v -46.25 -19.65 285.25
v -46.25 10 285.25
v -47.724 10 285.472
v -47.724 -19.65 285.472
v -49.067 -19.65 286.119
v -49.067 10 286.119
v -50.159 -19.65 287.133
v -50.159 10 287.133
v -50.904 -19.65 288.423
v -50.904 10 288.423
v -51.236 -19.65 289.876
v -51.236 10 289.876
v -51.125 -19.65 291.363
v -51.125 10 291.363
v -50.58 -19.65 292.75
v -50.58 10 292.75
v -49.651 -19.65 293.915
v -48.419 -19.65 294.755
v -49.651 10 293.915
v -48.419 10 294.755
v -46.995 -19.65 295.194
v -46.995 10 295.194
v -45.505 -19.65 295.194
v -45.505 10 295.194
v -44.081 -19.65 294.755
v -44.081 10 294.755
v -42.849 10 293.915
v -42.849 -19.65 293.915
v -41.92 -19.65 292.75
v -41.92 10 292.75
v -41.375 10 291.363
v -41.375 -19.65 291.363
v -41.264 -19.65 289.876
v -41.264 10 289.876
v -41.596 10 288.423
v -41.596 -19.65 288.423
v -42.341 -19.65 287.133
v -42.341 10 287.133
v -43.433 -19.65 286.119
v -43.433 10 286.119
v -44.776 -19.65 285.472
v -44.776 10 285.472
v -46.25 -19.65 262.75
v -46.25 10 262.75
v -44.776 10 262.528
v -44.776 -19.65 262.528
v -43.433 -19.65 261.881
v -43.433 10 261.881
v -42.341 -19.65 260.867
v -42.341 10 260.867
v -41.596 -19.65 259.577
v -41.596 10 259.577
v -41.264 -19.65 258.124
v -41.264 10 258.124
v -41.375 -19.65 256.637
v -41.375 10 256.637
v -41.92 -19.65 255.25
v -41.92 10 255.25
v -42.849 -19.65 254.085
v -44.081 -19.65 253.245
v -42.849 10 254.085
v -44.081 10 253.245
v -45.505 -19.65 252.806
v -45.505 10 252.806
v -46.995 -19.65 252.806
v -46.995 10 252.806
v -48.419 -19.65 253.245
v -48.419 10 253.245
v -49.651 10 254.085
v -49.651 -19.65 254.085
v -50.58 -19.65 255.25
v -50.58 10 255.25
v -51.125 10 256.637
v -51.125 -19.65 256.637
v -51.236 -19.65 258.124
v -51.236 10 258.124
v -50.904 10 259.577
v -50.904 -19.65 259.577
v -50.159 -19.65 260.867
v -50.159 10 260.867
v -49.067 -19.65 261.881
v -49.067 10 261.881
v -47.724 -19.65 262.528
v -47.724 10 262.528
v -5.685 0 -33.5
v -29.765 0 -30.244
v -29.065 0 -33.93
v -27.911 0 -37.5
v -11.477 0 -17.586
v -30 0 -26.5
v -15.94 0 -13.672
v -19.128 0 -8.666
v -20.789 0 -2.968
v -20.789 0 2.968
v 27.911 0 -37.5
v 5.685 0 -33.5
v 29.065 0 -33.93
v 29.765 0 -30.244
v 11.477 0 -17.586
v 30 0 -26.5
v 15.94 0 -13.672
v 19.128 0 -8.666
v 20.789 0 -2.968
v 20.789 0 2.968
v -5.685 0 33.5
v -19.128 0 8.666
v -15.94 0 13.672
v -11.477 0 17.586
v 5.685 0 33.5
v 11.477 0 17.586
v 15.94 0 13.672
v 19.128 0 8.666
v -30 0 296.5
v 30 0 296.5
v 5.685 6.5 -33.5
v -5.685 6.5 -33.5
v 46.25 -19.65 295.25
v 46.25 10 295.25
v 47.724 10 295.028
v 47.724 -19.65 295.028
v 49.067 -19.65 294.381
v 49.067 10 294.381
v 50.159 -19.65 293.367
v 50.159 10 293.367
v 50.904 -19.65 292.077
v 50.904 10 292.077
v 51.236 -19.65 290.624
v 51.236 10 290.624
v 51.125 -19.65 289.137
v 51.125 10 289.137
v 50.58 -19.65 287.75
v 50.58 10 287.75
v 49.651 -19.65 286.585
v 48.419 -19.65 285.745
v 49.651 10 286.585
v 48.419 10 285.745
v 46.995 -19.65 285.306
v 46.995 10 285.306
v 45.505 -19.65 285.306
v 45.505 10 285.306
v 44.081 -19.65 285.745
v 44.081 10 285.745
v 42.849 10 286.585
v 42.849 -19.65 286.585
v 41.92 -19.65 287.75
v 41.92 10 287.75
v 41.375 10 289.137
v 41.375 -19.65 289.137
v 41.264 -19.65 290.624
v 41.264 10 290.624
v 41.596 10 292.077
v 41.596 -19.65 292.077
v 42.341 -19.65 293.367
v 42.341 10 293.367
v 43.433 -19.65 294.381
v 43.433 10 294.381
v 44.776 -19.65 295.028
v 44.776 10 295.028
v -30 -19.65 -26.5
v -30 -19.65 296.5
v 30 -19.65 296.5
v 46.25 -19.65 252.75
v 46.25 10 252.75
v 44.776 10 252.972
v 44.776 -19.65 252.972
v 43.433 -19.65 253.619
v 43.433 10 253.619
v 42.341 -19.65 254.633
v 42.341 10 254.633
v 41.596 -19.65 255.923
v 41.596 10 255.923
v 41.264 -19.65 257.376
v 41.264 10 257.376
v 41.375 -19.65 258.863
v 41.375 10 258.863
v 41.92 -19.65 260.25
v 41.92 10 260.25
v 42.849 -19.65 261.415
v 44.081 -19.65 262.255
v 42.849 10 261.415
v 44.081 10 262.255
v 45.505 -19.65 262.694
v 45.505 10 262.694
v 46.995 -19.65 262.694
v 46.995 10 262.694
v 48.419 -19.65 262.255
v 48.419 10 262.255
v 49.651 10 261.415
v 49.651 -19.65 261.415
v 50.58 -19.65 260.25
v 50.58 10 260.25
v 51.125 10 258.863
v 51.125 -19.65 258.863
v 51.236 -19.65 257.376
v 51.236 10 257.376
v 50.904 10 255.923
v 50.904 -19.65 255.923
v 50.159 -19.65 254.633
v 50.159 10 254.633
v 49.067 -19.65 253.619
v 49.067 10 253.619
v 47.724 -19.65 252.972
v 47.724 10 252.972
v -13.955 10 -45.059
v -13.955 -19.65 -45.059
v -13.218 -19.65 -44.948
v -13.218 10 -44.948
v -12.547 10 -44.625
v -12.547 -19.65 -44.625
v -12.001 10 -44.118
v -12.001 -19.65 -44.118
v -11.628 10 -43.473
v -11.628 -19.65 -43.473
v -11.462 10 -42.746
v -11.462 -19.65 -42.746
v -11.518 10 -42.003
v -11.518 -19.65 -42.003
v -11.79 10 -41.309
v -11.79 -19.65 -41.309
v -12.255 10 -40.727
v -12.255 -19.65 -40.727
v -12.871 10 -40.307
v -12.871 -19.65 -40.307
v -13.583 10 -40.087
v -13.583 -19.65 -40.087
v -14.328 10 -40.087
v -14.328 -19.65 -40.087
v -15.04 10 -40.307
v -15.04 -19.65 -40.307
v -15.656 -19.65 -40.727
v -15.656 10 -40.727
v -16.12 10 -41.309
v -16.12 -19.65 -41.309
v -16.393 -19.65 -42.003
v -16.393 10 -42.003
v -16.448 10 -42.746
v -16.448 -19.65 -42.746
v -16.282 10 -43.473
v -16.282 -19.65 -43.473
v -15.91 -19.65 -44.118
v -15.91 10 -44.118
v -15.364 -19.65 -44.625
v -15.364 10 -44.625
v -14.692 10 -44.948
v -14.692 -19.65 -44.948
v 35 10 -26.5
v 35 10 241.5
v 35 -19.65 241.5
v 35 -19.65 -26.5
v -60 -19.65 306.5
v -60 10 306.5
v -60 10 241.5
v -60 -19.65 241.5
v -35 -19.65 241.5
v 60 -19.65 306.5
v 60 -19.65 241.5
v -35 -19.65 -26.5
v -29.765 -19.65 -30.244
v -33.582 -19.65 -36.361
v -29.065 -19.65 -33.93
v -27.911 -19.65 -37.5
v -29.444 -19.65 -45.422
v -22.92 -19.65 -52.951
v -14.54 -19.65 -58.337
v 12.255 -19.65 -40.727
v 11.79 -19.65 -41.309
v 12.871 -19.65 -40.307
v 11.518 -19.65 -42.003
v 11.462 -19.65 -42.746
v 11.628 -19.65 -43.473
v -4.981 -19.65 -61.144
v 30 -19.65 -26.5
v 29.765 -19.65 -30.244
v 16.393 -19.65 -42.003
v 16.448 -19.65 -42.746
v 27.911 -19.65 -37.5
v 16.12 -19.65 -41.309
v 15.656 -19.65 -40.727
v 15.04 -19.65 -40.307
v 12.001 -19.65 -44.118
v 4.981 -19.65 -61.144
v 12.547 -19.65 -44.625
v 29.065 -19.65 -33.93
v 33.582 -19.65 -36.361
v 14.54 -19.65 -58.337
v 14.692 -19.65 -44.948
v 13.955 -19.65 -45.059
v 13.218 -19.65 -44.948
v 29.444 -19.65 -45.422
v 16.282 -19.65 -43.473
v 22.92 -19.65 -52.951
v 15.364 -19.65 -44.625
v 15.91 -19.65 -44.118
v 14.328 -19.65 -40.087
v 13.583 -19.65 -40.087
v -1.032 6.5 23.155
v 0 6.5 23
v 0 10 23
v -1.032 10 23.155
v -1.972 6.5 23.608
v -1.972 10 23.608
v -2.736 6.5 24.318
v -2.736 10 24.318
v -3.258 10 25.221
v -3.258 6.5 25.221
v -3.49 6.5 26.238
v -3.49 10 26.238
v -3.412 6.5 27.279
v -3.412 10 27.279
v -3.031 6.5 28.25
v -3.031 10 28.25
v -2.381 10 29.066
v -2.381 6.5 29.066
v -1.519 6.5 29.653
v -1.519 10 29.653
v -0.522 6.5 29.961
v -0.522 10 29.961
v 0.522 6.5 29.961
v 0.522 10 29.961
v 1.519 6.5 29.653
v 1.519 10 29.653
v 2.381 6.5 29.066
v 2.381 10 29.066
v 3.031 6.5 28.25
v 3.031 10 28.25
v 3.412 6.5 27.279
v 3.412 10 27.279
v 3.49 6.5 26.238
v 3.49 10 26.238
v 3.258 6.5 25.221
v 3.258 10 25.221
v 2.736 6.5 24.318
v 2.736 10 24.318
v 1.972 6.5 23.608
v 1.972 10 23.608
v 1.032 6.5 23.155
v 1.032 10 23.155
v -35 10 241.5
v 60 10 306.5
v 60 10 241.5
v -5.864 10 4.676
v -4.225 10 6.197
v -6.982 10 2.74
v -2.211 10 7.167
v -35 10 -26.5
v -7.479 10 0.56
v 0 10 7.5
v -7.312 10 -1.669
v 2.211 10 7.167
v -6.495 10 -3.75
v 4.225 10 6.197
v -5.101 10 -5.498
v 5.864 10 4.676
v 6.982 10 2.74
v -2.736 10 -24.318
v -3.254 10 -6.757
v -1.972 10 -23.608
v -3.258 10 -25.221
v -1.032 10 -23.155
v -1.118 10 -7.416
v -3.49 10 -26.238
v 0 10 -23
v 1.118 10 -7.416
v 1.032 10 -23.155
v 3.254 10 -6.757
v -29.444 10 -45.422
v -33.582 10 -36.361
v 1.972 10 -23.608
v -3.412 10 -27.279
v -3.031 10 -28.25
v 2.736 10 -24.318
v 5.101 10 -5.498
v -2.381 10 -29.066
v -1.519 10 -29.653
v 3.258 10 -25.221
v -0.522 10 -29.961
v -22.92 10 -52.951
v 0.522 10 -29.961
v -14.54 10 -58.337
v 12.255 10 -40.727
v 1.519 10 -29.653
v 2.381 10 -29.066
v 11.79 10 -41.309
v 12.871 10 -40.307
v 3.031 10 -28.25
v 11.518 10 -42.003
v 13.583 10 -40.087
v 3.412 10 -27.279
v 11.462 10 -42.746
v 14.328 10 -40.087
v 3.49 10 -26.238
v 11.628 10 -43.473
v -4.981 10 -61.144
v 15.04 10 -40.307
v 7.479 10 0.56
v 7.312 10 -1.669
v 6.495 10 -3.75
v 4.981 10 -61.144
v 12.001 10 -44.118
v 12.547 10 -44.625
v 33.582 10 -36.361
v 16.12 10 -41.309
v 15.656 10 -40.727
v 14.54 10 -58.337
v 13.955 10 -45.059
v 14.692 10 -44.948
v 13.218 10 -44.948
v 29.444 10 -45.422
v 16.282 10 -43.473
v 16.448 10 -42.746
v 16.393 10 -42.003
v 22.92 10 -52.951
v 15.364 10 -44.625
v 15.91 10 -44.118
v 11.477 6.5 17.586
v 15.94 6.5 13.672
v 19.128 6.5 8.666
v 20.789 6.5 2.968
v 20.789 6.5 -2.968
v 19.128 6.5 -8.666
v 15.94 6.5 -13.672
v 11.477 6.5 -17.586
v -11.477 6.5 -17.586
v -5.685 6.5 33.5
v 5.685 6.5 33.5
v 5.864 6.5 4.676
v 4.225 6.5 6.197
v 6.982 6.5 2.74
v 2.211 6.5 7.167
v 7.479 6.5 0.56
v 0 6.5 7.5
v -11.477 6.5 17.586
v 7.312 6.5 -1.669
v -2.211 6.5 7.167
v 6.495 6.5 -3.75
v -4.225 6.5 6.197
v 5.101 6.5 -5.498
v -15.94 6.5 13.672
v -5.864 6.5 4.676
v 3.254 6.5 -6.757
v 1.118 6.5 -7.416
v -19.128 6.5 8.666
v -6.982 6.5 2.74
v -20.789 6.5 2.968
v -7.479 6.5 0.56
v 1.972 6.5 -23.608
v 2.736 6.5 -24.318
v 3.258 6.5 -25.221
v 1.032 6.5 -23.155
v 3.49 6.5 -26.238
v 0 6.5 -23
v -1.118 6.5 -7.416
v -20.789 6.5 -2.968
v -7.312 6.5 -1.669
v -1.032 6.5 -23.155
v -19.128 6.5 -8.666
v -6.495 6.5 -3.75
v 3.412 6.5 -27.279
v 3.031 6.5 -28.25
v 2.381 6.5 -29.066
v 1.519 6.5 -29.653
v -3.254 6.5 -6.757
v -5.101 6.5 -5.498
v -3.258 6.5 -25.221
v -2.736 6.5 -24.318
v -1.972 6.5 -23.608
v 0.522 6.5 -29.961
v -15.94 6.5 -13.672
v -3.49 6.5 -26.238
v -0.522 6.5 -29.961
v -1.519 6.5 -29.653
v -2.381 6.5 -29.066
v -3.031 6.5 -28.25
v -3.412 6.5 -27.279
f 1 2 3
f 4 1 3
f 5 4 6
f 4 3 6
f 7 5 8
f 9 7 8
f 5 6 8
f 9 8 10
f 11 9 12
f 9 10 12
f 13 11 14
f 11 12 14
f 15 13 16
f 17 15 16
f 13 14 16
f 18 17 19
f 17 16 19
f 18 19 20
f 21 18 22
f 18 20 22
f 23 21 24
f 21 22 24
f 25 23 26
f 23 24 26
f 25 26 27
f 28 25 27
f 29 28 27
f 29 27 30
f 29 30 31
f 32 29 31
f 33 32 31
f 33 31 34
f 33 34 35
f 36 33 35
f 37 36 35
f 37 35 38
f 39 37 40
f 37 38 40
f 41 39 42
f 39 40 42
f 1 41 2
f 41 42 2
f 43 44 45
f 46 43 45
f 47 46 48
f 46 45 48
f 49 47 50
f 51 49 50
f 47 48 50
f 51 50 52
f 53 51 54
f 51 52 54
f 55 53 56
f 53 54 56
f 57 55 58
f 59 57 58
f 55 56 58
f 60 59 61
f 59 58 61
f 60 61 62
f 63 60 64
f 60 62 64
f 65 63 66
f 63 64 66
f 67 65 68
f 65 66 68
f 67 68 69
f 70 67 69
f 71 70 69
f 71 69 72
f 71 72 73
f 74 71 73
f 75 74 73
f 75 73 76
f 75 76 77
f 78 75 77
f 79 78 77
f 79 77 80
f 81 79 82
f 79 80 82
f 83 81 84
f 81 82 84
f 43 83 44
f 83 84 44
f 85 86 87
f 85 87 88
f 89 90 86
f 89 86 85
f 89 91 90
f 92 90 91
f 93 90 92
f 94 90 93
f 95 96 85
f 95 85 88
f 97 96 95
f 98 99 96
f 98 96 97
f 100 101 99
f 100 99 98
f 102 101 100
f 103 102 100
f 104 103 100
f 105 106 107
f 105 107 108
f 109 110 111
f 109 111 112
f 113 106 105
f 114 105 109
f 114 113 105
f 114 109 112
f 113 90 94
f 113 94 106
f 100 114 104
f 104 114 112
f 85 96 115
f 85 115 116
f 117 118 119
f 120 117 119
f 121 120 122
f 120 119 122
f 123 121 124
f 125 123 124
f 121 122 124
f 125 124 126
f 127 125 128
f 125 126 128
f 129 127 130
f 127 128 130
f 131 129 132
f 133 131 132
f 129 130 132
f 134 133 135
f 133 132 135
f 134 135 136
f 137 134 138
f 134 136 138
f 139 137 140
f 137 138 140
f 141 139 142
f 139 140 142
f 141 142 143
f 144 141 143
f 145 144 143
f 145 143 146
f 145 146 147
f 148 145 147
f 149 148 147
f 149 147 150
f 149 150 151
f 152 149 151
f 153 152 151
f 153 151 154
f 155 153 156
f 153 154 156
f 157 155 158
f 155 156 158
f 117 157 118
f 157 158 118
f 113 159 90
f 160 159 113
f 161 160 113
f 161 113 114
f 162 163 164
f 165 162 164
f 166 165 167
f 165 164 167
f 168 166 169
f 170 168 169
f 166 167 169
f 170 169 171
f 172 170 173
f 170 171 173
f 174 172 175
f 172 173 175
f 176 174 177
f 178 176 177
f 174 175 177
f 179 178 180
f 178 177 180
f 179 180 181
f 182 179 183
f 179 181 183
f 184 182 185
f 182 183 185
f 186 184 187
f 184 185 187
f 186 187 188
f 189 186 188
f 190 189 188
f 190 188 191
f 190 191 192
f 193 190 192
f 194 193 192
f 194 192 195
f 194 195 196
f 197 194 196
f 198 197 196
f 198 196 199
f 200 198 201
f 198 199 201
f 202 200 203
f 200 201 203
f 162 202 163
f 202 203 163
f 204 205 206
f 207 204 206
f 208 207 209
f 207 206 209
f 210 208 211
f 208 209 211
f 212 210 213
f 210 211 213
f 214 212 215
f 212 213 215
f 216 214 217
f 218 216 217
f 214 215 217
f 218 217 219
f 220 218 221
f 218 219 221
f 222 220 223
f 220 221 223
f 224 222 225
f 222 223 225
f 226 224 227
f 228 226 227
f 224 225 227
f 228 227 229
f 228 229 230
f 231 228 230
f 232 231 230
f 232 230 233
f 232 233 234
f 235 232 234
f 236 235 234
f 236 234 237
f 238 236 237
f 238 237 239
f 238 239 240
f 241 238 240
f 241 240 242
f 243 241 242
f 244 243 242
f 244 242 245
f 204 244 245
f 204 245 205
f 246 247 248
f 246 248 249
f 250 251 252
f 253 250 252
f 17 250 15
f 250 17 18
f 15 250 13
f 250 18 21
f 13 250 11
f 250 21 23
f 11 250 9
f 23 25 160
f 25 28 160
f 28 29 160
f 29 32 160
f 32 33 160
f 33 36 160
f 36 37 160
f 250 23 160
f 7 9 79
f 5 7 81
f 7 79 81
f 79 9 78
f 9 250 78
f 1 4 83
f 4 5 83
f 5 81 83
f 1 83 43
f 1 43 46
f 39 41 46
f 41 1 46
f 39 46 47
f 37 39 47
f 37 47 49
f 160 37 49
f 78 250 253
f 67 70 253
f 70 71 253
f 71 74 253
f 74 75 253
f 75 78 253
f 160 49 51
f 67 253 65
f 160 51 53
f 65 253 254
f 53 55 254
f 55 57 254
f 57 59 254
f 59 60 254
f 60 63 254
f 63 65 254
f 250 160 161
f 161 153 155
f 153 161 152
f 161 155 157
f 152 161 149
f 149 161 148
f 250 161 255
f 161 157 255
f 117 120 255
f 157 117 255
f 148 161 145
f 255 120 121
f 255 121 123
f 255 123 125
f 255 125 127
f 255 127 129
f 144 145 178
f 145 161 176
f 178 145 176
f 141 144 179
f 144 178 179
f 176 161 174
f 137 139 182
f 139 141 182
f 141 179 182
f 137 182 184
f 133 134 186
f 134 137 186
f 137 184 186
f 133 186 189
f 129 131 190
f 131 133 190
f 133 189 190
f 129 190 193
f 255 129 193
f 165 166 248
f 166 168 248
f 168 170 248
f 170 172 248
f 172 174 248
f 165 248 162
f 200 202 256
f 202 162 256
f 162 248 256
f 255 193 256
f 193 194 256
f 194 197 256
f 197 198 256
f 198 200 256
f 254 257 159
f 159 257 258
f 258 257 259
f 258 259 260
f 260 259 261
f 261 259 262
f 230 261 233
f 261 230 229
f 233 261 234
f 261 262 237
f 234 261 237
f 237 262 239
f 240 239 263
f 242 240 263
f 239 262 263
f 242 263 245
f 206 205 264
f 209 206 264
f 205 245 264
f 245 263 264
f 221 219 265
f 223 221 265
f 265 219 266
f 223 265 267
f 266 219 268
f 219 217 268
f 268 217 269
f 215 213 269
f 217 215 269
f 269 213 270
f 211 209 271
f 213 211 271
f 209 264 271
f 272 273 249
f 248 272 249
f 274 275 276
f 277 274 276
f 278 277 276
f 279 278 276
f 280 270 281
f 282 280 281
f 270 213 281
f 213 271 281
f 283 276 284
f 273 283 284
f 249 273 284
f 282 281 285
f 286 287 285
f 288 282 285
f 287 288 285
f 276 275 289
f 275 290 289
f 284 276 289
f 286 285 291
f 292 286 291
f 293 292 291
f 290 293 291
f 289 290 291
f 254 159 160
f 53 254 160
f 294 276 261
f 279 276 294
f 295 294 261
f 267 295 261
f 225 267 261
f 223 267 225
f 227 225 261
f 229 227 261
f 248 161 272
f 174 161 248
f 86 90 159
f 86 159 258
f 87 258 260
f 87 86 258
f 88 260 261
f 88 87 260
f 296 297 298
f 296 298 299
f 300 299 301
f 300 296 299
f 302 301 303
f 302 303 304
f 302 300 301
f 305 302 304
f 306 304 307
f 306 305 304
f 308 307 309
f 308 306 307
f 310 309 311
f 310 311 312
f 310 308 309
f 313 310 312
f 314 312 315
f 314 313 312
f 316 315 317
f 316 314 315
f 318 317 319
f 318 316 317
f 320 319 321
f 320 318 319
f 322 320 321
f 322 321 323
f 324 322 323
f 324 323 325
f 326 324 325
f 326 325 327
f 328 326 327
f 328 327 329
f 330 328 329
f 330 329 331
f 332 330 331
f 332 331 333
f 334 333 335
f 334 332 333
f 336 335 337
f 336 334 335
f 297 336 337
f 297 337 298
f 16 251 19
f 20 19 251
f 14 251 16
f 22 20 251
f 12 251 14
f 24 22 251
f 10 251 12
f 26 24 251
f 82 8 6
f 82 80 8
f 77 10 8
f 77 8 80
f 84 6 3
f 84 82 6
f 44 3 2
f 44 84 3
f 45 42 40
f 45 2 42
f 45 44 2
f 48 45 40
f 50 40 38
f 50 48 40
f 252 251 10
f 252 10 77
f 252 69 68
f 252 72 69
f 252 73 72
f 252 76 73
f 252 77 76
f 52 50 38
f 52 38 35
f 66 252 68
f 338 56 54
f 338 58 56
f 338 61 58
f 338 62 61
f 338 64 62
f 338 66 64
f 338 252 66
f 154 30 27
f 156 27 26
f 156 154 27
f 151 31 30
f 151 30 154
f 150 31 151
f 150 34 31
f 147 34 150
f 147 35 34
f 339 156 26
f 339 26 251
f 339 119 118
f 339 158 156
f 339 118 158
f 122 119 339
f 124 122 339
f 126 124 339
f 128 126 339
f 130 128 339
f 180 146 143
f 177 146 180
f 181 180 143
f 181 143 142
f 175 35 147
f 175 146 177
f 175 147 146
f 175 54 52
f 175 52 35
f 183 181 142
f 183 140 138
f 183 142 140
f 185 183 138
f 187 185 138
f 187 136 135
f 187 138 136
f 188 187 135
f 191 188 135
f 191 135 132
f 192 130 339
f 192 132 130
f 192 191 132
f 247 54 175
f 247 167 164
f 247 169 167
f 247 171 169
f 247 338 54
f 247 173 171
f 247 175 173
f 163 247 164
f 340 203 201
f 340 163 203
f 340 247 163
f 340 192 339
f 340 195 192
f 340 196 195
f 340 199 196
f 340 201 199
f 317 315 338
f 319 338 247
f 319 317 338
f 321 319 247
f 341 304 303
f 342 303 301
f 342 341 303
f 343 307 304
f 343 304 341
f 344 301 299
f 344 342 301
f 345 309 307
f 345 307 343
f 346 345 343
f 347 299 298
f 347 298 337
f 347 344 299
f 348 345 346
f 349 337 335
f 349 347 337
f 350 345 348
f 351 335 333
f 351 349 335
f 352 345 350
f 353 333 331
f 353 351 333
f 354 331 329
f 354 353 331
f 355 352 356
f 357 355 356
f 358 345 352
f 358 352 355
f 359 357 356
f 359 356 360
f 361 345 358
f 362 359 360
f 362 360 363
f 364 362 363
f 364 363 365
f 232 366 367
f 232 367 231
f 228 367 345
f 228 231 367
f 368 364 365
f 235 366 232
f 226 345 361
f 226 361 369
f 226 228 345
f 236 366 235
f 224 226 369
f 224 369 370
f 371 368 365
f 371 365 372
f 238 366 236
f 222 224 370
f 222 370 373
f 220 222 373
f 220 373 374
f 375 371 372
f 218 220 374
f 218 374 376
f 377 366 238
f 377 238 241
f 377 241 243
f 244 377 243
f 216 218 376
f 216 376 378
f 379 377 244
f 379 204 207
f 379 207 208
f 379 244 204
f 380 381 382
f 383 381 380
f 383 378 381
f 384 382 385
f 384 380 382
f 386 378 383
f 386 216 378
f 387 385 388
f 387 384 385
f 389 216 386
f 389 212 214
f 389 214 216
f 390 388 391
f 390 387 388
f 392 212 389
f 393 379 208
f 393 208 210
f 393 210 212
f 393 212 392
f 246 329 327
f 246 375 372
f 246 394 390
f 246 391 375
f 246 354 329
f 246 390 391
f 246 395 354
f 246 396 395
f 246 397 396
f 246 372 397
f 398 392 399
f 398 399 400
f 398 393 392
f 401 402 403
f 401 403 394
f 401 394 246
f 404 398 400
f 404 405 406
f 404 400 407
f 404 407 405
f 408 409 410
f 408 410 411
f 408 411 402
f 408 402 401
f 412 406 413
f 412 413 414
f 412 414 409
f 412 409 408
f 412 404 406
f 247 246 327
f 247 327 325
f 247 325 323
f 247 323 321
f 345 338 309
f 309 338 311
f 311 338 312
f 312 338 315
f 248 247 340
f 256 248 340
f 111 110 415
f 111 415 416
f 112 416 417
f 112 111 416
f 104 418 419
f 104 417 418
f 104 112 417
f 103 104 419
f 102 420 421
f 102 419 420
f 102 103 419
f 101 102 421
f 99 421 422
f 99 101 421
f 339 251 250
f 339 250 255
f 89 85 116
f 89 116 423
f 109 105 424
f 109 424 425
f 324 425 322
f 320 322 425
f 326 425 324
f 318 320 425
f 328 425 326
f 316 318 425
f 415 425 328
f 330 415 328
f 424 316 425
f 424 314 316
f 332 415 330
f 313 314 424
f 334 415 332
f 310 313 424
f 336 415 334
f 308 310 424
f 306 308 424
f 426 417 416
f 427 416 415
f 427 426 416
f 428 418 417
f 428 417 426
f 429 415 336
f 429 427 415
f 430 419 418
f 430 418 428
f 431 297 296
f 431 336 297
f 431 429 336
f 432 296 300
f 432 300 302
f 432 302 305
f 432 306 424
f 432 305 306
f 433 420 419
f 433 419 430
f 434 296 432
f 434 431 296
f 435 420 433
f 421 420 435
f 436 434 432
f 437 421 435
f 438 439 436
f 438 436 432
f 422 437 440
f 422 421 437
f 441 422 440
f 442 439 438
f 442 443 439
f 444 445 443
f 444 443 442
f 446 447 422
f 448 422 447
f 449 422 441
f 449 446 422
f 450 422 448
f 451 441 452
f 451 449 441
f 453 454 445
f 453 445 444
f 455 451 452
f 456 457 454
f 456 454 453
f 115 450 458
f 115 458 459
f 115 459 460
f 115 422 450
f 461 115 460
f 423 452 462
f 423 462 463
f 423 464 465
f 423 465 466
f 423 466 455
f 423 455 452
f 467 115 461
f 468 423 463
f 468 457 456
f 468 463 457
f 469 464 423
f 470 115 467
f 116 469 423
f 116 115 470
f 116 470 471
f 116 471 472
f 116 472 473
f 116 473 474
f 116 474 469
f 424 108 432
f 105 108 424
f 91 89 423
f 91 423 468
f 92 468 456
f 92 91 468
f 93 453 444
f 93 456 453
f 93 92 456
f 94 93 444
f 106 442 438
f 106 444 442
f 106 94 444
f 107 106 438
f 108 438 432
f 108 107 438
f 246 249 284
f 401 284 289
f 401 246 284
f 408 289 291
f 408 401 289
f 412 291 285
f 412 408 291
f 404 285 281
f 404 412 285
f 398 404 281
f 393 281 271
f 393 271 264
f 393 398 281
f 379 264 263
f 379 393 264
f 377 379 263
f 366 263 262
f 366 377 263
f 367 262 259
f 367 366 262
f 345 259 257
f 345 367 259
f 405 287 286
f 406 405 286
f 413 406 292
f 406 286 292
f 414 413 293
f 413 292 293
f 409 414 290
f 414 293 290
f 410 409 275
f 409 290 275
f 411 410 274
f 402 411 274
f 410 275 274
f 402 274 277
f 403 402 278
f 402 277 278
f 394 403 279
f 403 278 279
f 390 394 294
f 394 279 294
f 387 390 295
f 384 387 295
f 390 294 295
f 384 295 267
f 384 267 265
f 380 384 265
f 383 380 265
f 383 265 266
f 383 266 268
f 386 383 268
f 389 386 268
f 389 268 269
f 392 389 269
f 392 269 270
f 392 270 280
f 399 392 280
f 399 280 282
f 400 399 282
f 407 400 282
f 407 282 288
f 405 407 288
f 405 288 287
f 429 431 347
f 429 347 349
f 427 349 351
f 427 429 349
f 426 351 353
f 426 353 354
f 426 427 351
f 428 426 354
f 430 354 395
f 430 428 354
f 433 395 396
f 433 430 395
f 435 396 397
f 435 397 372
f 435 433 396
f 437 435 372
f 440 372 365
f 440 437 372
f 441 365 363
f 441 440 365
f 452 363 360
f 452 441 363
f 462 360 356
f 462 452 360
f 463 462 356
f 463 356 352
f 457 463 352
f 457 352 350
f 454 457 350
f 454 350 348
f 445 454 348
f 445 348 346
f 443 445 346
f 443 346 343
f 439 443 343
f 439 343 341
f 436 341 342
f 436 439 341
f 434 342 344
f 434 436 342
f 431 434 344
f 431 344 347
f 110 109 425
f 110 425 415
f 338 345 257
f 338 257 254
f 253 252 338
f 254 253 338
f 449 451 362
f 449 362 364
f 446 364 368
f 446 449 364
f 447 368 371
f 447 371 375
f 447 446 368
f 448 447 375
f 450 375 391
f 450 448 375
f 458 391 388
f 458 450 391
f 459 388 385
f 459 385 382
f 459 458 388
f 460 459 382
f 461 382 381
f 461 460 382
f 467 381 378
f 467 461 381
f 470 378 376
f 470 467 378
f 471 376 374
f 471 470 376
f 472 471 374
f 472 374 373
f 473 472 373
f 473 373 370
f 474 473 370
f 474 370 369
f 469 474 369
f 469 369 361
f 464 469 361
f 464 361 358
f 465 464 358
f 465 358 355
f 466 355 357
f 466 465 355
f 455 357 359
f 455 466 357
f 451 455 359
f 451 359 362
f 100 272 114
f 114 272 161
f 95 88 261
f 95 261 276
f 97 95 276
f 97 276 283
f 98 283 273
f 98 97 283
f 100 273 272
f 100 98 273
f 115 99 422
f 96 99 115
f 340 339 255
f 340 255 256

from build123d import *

# Parameters (mm, degrees)
BOSS_EXTRUDE1_DEPTH             = 10
BOSS_EXTRUDE2_START             = -3.5
SKETCH2_R                       = 3.5
SKETCH2_R_2                     = 7.5
BOSS_EXTRUDE2_DEPTH             = 3.5
BOSS_EXTRUDE3_REACH             = 247.545
BOSS_EXTRUDE3_DIRECTION_2_DEPTH = 19.65
SKETCH4_R                       = 2.5
CUT_EXTRUDE1_DEPTH              = 248.78291406
SKETCH5_W                       = 120
SKETCH5_H                       = 65
SKETCH5_R                       = 5
BOSS_EXTRUDE4_DEPTH             = 29.65
SKETCH6_W                       = 60
SKETCH6_H                       = 55
CUT_EXTRUDE2_DEPTH              = 19.65


with BuildPart() as part:
    # Sketch1 → Boss-Extrude1 (new body)
    with BuildSketch(Plane(origin=(0, 0, 0), x_dir=(1, 0, 0), z_dir=(0, 1, 0))):
        with BuildLine():
            Line((30, 26.5), (30, -243.5))
            Line((30, -243.5), (-30, -243.5))
            Line((-30, -243.5), (-30, 26.5))
            ThreePointArc((-30, 26.5), (0, 56.5), (30, 26.5))
        make_face()
        with BuildLine():
            ThreePointArc((11.477382224, -17.586065429), (21, 0), (11.477382224, 17.586065429))
            Line((11.477382224, 17.586065429), (5.68518373, 33.5))
            Line((5.68518373, 33.5), (-5.68518373, 33.5))
            Line((-5.68518373, 33.5), (-11.477382224, 17.586065429))
            ThreePointArc((-11.477382224, 17.586065429), (-21, 0), (-11.477382224, -17.586065429))
            Line((-11.477382224, -17.586065429), (-5.68518373, -33.5))
            Line((-5.68518373, -33.5), (5.68518373, -33.5))
            Line((5.68518373, -33.5), (11.477382224, -17.586065429))
        make_face(mode=Mode.SUBTRACT)
    extrude(amount=BOSS_EXTRUDE1_DEPTH)

    # Sketch2 → Boss-Extrude2 (add)
    with BuildSketch(Plane(origin=(0, 10, 0), x_dir=(1, 0, 0), z_dir=(0, 1, 0)).offset(BOSS_EXTRUDE2_START)):
        with BuildLine():
            Line((5.68518373, 33.5), (11.477382224, 17.586065429))
            ThreePointArc((11.477382224, 17.586065429), (21, 0), (11.477382224, -17.586065429))
            Line((11.477382224, -17.586065429), (5.68518373, -33.5))
            Line((5.68518373, -33.5), (-5.68518373, -33.5))
            Line((-5.68518373, -33.5), (-11.477382224, -17.586065429))
            ThreePointArc((-11.477382224, -17.586065429), (-21, 0), (-11.477382224, 17.586065429))
            Line((-11.477382224, 17.586065429), (-5.68518373, 33.5))
            Line((-5.68518373, 33.5), (5.68518373, 33.5))
        make_face()
        with Locations(Location((0, 26.5, 0), (0, 0, 270))):
            Circle(SKETCH2_R, mode=Mode.SUBTRACT)
        with Locations(Location((0, -26.5, 0), (0, 0, 90))):
            Circle(SKETCH2_R, mode=Mode.SUBTRACT)
        with Locations(Location((0, 0, 0), (0, 0, 270))):
            Circle(SKETCH2_R_2, mode=Mode.SUBTRACT)
    extrude(amount=BOSS_EXTRUDE2_DEPTH)

    # Boss-Extrude3: up to this face of the body (flat: up to its plane)
    boss_extrude3_end = Plane(part.part.faces().sort_by_distance((0, 10, 98.054911476))[0])
    # Sketch3 → Boss-Extrude3 (add, up to the picked face)
    with BuildSketch(Plane.XZ, mode=Mode.PRIVATE) as boss_extrude3_sk1:
        with BuildLine():
            Line((35, 243.5), (35, -26.5))
            ThreePointArc((35, -26.5), (0, -61.5), (-35, -26.5))
            Line((-35, -26.5), (-35, 243.5))
            Line((-35, 243.5), (-30, 243.5))
            Line((-30, 243.5), (-30, -26.5))
            ThreePointArc((-30, -26.5), (-29.473014303, -32.09834153), (-27.910571474, -37.5))
            Line((-27.910571474, -37.5), (27.910571474, -37.5))
            ThreePointArc((27.910571474, -37.5), (29.473014303, -32.09834153), (30, -26.5))
            Line((30, -26.5), (30, 243.5))
            Line((30, 243.5), (35, 243.5))
        make_face()
    boss_extrude3_tool1 = split(extrude(boss_extrude3_sk1.sketch, amount=-BOSS_EXTRUDE3_REACH, mode=Mode.PRIVATE), bisect_by=boss_extrude3_end, keep=Keep.BOTH, mode=Mode.PRIVATE)
    add(boss_extrude3_tool1.solids().sort_by(Axis((33.129297, 0, 108.5), (0, 1, 0)))[0])

    # Sketch3 → Boss-Extrude3 direction 2 (add)
    with BuildSketch(Plane.XZ):
        with BuildLine():
            Line((35, 243.5), (35, -26.5))
            ThreePointArc((35, -26.5), (0, -61.5), (-35, -26.5))
            Line((-35, -26.5), (-35, 243.5))
            Line((-35, 243.5), (-30, 243.5))
            Line((-30, 243.5), (-30, -26.5))
            ThreePointArc((-30, -26.5), (-29.473014303, -32.09834153), (-27.910571474, -37.5))
            Line((-27.910571474, -37.5), (27.910571474, -37.5))
            ThreePointArc((27.910571474, -37.5), (29.473014303, -32.09834153), (30, -26.5))
            Line((30, -26.5), (30, 243.5))
            Line((30, 243.5), (35, 243.5))
        make_face()
    extrude(amount=BOSS_EXTRUDE3_DIRECTION_2_DEPTH)

    # Sketch4 → Cut-Extrude1 (cut, through all)
    with BuildSketch(Plane.XZ.offset(19.65)):
        with Locations(Location((-13.955285737, -42.559356041, 0), (0, 0, 270))):
            Circle(SKETCH4_R)
        with Locations(Location((13.955285737, -42.559356041, 0), (0, 0, 270))):
            Circle(SKETCH4_R)
    extrude(amount=-CUT_EXTRUDE1_DEPTH, mode=Mode.SUBTRACT)

    # Sketch5 → Boss-Extrude4 (add)
    with BuildSketch(Plane(origin=(0, 10, 0), x_dir=(1, 0, 0), z_dir=(0, 1, 0))):
        with Locations((0, -274)):
            Rectangle(SKETCH5_W, SKETCH5_H)
        with Locations(Location((46.25, -290.25, 0), (0, 0, 270))):
            Circle(SKETCH5_R, mode=Mode.SUBTRACT)
        with Locations(Location((-46.25, -290.25, 0), (0, 0, 90))):
            Circle(SKETCH5_R, mode=Mode.SUBTRACT)
        with Locations(Location((46.25, -257.75, 0), (0, 0, 90))):
            Circle(SKETCH5_R, mode=Mode.SUBTRACT)
        with Locations(Location((-46.25, -257.75, 0), (0, 0, 270))):
            Circle(SKETCH5_R, mode=Mode.SUBTRACT)
    extrude(amount=-BOSS_EXTRUDE4_DEPTH)

    # Sketch6 → Cut-Extrude2 (cut)
    with BuildSketch(Plane.XZ.offset(19.65)):
        with Locations((0, 269)):
            Rectangle(SKETCH6_W, SKETCH6_H)
    extrude(amount=-CUT_EXTRUDE2_DEPTH, mode=Mode.SUBTRACT)


solid = part.part
